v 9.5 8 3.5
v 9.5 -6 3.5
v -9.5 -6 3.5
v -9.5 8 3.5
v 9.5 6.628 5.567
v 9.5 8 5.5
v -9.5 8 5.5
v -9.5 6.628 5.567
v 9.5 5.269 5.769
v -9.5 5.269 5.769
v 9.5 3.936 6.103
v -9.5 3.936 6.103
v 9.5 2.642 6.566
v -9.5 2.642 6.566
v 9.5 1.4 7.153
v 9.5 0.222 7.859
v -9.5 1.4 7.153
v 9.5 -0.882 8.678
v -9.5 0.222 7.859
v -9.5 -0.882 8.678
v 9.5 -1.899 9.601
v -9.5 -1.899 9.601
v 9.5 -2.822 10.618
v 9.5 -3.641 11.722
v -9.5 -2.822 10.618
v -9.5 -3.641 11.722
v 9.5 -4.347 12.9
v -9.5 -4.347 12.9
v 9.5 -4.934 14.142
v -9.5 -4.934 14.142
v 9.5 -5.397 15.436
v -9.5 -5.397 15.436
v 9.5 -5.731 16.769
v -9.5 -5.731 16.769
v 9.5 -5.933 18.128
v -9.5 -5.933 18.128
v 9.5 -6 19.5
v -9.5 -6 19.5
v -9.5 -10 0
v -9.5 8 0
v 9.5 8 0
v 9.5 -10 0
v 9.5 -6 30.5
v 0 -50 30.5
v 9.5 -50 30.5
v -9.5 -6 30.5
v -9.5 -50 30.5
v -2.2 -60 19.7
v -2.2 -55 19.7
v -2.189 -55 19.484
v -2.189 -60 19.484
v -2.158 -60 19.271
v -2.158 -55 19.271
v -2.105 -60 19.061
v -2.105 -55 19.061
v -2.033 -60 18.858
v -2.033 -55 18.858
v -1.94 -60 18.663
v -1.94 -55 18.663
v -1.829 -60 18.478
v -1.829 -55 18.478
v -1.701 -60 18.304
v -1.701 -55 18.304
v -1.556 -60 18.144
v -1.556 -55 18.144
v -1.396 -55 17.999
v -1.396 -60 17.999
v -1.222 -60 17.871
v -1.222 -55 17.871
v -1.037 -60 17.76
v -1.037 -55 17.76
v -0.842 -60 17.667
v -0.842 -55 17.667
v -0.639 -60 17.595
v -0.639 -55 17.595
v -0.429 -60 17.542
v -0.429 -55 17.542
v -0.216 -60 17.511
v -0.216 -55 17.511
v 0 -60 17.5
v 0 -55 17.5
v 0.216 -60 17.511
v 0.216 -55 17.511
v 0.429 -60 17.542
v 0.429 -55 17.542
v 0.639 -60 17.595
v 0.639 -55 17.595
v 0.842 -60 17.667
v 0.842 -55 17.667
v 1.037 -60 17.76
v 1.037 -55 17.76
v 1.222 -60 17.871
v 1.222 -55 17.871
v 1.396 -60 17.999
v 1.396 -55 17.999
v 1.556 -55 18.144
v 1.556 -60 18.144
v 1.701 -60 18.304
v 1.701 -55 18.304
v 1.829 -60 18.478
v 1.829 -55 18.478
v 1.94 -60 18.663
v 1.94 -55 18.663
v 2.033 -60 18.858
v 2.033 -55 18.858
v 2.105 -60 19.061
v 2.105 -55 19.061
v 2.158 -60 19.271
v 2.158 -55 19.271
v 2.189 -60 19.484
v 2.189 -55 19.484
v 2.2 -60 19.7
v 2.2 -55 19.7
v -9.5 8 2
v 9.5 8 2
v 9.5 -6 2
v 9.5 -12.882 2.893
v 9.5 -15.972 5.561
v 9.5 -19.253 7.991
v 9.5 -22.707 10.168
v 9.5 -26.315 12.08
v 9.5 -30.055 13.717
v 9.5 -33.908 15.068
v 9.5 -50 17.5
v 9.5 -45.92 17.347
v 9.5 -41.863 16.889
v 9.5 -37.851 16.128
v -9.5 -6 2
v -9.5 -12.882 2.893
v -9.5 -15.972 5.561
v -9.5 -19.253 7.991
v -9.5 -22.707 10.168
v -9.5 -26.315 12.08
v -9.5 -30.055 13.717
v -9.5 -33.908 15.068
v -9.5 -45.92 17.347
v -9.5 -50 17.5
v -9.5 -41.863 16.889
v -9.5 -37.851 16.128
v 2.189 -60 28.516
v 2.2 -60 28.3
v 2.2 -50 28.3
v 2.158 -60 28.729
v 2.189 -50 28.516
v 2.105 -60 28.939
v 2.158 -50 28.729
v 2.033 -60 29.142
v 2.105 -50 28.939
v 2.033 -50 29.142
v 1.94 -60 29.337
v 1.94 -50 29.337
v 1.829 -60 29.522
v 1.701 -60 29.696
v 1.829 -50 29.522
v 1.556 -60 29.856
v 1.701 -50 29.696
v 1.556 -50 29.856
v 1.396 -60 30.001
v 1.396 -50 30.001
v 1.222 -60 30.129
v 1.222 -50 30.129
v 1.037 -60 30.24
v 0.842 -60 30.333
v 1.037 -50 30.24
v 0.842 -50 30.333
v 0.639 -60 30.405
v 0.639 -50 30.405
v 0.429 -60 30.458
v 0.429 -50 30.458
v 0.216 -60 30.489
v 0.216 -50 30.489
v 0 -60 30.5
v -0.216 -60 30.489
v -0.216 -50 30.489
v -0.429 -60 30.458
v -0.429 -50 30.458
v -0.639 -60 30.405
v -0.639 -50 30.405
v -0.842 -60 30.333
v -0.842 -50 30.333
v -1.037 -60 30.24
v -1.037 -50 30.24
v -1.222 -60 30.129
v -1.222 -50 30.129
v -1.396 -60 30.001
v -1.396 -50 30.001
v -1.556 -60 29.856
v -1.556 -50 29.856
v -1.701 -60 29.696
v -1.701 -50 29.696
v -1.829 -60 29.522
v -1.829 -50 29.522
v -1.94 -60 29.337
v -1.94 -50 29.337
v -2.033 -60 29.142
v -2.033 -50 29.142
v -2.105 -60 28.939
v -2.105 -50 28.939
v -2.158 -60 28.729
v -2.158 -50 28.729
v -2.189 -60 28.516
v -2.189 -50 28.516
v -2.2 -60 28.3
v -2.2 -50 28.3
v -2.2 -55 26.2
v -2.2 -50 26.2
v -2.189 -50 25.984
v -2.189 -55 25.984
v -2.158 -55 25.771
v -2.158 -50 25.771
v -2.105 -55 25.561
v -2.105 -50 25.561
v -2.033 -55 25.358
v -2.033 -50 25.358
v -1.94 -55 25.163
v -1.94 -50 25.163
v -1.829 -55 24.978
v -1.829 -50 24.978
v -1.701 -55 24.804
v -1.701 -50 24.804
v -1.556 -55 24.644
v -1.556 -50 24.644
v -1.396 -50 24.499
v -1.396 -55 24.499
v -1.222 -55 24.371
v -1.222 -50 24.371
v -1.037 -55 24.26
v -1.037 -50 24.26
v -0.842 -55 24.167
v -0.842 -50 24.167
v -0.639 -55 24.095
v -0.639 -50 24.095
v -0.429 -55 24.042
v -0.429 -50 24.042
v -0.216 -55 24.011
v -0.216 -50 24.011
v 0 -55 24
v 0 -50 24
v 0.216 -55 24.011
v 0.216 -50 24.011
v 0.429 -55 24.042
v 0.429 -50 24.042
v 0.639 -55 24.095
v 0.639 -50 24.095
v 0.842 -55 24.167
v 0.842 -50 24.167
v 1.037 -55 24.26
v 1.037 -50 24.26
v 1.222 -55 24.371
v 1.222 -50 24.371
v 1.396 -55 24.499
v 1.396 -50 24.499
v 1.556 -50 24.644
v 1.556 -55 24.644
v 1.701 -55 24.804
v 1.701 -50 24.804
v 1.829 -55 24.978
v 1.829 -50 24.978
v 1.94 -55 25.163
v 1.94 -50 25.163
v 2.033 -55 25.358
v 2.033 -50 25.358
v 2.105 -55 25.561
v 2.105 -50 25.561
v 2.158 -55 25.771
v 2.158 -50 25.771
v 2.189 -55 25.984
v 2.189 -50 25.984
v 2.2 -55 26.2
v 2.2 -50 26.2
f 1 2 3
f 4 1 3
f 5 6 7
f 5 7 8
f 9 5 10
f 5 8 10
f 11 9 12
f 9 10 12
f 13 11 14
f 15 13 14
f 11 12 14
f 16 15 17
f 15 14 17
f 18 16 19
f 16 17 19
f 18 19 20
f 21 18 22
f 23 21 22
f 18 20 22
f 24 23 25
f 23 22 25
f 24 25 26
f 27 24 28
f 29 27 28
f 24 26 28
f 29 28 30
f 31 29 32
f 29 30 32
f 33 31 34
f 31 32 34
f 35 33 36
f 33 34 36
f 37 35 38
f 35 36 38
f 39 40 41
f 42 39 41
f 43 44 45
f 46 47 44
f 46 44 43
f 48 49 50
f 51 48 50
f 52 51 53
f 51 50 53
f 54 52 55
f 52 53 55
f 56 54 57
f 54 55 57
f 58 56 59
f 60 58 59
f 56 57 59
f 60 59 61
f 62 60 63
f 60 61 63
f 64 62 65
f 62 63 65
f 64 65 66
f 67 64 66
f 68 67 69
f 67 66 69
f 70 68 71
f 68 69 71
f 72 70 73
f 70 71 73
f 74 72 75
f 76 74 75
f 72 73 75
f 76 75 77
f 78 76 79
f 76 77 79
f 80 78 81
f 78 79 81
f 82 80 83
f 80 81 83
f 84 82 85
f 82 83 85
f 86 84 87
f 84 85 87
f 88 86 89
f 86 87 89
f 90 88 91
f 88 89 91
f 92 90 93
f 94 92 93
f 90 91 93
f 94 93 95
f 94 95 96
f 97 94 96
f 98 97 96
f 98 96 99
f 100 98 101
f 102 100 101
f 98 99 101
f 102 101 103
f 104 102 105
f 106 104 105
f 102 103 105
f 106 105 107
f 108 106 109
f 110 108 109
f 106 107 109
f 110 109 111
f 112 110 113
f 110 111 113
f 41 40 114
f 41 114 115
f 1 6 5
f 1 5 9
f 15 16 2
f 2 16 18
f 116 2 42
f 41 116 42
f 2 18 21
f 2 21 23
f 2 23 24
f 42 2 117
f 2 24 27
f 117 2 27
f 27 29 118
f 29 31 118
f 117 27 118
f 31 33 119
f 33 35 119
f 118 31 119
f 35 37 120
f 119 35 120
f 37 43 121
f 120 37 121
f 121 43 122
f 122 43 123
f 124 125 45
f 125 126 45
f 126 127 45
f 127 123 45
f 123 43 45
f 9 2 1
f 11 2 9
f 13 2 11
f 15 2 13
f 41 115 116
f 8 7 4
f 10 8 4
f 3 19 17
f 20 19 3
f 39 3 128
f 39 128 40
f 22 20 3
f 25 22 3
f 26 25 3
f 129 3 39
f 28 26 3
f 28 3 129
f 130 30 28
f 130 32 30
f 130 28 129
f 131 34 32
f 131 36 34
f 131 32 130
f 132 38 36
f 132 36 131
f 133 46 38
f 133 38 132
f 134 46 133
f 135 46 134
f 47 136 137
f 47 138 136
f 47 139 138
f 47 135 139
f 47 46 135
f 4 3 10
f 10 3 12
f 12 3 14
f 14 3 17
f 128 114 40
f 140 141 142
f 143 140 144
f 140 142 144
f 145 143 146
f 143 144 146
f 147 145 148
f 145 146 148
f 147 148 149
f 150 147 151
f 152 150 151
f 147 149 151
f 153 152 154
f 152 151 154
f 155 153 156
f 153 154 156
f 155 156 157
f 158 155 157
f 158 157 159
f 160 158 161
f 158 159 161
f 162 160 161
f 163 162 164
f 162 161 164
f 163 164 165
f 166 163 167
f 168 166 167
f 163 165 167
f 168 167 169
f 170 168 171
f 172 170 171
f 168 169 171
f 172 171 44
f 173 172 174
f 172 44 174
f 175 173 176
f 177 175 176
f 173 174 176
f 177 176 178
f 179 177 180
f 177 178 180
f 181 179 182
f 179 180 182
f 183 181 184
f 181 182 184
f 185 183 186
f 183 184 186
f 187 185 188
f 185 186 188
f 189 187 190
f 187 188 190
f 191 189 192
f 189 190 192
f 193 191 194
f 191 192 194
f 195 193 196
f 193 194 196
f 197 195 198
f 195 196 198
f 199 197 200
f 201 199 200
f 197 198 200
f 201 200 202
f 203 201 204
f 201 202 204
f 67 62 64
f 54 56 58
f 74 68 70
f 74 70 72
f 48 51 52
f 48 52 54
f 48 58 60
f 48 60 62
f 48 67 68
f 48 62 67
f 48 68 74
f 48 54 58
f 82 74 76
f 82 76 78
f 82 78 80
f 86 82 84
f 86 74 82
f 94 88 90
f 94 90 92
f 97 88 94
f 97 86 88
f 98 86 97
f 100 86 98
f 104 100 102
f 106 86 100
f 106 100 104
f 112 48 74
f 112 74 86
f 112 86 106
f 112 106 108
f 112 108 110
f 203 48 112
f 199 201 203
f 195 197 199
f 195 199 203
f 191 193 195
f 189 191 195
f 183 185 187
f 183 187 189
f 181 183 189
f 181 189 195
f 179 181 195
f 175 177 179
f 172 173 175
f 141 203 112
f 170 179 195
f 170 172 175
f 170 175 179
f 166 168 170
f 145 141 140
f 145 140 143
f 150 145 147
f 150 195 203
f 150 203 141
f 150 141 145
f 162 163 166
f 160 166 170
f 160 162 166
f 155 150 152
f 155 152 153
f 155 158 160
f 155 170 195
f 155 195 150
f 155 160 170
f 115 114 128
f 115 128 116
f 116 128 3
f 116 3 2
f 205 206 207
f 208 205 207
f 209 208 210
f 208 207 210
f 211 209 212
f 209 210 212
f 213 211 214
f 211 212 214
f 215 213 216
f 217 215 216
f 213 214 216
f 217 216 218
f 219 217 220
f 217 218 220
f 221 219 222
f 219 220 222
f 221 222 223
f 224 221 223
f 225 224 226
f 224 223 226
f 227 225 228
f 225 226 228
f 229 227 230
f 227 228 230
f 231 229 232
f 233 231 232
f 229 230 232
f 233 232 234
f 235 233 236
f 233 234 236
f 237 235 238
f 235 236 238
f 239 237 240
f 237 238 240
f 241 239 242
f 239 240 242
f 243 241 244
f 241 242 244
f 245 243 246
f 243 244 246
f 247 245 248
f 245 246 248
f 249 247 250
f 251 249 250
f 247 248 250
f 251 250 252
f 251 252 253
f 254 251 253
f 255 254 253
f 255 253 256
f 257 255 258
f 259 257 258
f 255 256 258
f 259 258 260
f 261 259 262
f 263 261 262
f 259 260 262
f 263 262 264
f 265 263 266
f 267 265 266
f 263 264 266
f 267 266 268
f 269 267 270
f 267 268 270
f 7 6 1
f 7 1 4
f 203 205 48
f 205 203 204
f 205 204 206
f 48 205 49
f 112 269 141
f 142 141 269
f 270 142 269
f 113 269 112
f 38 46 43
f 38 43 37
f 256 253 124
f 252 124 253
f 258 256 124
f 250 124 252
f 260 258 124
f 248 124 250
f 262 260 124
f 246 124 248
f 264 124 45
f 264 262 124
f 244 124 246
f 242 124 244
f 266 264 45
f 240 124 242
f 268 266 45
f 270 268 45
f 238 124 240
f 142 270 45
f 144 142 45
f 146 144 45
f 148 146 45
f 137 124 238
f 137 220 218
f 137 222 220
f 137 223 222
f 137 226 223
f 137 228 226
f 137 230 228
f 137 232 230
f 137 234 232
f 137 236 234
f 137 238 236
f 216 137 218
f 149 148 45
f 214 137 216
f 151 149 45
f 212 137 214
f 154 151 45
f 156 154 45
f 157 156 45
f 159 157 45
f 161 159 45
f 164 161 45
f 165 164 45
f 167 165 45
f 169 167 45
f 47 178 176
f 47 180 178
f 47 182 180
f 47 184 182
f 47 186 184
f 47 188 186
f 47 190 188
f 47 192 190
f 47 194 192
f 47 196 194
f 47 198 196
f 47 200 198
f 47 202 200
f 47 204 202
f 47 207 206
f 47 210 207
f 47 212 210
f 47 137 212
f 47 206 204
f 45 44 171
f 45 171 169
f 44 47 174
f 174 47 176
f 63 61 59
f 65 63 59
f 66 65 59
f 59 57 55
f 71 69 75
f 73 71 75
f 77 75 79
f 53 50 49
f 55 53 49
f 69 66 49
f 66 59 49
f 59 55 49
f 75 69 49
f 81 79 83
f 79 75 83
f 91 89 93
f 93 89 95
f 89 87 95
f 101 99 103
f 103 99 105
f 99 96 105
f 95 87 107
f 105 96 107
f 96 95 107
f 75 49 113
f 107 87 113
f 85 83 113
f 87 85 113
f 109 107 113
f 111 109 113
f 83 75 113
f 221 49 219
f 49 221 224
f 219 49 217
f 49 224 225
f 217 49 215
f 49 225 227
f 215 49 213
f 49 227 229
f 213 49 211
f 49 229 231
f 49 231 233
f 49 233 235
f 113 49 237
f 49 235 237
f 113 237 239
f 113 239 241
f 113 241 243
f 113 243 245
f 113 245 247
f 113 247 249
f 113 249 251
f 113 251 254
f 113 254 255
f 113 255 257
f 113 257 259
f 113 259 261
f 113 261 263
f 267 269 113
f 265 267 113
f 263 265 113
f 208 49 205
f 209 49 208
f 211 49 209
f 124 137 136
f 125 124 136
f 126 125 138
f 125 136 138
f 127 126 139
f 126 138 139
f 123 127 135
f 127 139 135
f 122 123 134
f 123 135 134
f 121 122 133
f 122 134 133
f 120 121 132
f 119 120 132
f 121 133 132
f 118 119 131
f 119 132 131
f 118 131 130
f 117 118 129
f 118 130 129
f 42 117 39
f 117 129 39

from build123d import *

# Parameters (mm, degrees)
SKETCH_W     = 19
SKETCH_H     = 18
PAD_DEPTH    = 2
SKETCH001_W  = 19
SKETCH001_H  = 4
PAD001_DEPTH = 3.5
SKETCH002_W  = 19
SKETCH002_H  = 2
PAD002_DEPTH = 14
SKETCH003_W  = 19
SKETCH003_H  = 4
PAD003_DEPTH = 14
PAD004_DEPTH = 19
PAD005_DEPTH = 19
PAD006_DEPTH = 5
PAD007_DEPTH = 5


with BuildPart() as part:
    # Sketch → Pad (new body)
    with BuildSketch(Plane.XY):
        with Locations((0, -1)):
            Rectangle(SKETCH_W, SKETCH_H)
    extrude(amount=PAD_DEPTH)

    # Sketch001 (on Face6 of Pad) → Pad001 (join)
    with BuildSketch(Plane.XY.offset(2)):
        with Locations((0, -8)):
            Rectangle(SKETCH001_W, SKETCH001_H)
    extrude(amount=PAD001_DEPTH)

    # Sketch002 (on Face4 of Pad001) → Pad002 (join)
    with BuildSketch(Plane(origin=(0, -6, 0), x_dir=(-1, 0, 0), z_dir=(0, 1, 0))):
        with Locations((0, 4.5)):
            Rectangle(SKETCH002_W, SKETCH002_H)
    extrude(amount=PAD002_DEPTH)

    # Sketch003 (on Face10 of Pad002) → Pad003 (join)
    with BuildSketch(Plane.XY.offset(5.5)):
        with Locations((0, -8)):
            Rectangle(SKETCH003_W, SKETCH003_H)
    extrude(amount=PAD003_DEPTH)

    # Sketch004 (on Face11 of Pad003) → Pad004 (join)
    with BuildSketch(Plane(origin=(-9.5, 0, 0), x_dir=(0, -1, 0), z_dir=(-1, 0, 0))):
        with BuildLine():
            Line((-8, 5.5), (6, 5.5))
            Line((6, 19.5), (6, 5.5))
            ThreePointArc((-8, 5.5), (1.899495, 9.600505), (6, 19.5))
        make_face()
    extrude(amount=-PAD004_DEPTH)

    # Sketch005 (on Face11 of Pad004) → Pad005 (join)
    with BuildSketch(Plane(origin=(-9.5, 0, 0), x_dir=(0, -1, 0), z_dir=(-1, 0, 0))):
        with BuildLine():
            Line((10, 30.5), (6, 30.5))
            Line((6, 30.5), (6, 19.5))
            Line((6, 19.5), (10, 19.5))
            Line((10, 19.5), (10, 0))
            ThreePointArc((50, 17.5), (28.169689, 12.933569), (10, 0))
            Line((50, 17.5), (50, 30.5))
            Line((50, 30.5), (10, 30.5))
        make_face()
    extrude(amount=-PAD005_DEPTH)

    # Sketch006 (on Face10 of Pad005) → Pad006 (join)
    with BuildSketch(Plane.XZ.offset(50)):
        with BuildLine():
            ThreePointArc((-2.2, 26.2), (0, 24), (2.2, 26.2))
            Line((2.2, 26.2), (2.2, 28.3))
            ThreePointArc((2.2, 28.3), (0, 30.5), (-2.2, 28.3))
            Line((-2.2, 26.2), (-2.2, 28.3))
        make_face()
    extrude(amount=PAD006_DEPTH)

    # Sketch007 (on Face18 of Pad006) → Pad007 (join)
    with BuildSketch(Plane.XZ.offset(55)):
        with BuildLine():
            ThreePointArc((2.2, 28.3), (0, 30.5), (-2.2, 28.3))
            Line((-2.2, 28.3), (-2.2, 19.7))
            ThreePointArc((-2.2, 19.7), (0, 17.5), (2.2, 19.7))
            Line((2.2, 28.3), (2.2, 19.7))
        make_face()
    extrude(amount=PAD007_DEPTH)


solid = part.part
